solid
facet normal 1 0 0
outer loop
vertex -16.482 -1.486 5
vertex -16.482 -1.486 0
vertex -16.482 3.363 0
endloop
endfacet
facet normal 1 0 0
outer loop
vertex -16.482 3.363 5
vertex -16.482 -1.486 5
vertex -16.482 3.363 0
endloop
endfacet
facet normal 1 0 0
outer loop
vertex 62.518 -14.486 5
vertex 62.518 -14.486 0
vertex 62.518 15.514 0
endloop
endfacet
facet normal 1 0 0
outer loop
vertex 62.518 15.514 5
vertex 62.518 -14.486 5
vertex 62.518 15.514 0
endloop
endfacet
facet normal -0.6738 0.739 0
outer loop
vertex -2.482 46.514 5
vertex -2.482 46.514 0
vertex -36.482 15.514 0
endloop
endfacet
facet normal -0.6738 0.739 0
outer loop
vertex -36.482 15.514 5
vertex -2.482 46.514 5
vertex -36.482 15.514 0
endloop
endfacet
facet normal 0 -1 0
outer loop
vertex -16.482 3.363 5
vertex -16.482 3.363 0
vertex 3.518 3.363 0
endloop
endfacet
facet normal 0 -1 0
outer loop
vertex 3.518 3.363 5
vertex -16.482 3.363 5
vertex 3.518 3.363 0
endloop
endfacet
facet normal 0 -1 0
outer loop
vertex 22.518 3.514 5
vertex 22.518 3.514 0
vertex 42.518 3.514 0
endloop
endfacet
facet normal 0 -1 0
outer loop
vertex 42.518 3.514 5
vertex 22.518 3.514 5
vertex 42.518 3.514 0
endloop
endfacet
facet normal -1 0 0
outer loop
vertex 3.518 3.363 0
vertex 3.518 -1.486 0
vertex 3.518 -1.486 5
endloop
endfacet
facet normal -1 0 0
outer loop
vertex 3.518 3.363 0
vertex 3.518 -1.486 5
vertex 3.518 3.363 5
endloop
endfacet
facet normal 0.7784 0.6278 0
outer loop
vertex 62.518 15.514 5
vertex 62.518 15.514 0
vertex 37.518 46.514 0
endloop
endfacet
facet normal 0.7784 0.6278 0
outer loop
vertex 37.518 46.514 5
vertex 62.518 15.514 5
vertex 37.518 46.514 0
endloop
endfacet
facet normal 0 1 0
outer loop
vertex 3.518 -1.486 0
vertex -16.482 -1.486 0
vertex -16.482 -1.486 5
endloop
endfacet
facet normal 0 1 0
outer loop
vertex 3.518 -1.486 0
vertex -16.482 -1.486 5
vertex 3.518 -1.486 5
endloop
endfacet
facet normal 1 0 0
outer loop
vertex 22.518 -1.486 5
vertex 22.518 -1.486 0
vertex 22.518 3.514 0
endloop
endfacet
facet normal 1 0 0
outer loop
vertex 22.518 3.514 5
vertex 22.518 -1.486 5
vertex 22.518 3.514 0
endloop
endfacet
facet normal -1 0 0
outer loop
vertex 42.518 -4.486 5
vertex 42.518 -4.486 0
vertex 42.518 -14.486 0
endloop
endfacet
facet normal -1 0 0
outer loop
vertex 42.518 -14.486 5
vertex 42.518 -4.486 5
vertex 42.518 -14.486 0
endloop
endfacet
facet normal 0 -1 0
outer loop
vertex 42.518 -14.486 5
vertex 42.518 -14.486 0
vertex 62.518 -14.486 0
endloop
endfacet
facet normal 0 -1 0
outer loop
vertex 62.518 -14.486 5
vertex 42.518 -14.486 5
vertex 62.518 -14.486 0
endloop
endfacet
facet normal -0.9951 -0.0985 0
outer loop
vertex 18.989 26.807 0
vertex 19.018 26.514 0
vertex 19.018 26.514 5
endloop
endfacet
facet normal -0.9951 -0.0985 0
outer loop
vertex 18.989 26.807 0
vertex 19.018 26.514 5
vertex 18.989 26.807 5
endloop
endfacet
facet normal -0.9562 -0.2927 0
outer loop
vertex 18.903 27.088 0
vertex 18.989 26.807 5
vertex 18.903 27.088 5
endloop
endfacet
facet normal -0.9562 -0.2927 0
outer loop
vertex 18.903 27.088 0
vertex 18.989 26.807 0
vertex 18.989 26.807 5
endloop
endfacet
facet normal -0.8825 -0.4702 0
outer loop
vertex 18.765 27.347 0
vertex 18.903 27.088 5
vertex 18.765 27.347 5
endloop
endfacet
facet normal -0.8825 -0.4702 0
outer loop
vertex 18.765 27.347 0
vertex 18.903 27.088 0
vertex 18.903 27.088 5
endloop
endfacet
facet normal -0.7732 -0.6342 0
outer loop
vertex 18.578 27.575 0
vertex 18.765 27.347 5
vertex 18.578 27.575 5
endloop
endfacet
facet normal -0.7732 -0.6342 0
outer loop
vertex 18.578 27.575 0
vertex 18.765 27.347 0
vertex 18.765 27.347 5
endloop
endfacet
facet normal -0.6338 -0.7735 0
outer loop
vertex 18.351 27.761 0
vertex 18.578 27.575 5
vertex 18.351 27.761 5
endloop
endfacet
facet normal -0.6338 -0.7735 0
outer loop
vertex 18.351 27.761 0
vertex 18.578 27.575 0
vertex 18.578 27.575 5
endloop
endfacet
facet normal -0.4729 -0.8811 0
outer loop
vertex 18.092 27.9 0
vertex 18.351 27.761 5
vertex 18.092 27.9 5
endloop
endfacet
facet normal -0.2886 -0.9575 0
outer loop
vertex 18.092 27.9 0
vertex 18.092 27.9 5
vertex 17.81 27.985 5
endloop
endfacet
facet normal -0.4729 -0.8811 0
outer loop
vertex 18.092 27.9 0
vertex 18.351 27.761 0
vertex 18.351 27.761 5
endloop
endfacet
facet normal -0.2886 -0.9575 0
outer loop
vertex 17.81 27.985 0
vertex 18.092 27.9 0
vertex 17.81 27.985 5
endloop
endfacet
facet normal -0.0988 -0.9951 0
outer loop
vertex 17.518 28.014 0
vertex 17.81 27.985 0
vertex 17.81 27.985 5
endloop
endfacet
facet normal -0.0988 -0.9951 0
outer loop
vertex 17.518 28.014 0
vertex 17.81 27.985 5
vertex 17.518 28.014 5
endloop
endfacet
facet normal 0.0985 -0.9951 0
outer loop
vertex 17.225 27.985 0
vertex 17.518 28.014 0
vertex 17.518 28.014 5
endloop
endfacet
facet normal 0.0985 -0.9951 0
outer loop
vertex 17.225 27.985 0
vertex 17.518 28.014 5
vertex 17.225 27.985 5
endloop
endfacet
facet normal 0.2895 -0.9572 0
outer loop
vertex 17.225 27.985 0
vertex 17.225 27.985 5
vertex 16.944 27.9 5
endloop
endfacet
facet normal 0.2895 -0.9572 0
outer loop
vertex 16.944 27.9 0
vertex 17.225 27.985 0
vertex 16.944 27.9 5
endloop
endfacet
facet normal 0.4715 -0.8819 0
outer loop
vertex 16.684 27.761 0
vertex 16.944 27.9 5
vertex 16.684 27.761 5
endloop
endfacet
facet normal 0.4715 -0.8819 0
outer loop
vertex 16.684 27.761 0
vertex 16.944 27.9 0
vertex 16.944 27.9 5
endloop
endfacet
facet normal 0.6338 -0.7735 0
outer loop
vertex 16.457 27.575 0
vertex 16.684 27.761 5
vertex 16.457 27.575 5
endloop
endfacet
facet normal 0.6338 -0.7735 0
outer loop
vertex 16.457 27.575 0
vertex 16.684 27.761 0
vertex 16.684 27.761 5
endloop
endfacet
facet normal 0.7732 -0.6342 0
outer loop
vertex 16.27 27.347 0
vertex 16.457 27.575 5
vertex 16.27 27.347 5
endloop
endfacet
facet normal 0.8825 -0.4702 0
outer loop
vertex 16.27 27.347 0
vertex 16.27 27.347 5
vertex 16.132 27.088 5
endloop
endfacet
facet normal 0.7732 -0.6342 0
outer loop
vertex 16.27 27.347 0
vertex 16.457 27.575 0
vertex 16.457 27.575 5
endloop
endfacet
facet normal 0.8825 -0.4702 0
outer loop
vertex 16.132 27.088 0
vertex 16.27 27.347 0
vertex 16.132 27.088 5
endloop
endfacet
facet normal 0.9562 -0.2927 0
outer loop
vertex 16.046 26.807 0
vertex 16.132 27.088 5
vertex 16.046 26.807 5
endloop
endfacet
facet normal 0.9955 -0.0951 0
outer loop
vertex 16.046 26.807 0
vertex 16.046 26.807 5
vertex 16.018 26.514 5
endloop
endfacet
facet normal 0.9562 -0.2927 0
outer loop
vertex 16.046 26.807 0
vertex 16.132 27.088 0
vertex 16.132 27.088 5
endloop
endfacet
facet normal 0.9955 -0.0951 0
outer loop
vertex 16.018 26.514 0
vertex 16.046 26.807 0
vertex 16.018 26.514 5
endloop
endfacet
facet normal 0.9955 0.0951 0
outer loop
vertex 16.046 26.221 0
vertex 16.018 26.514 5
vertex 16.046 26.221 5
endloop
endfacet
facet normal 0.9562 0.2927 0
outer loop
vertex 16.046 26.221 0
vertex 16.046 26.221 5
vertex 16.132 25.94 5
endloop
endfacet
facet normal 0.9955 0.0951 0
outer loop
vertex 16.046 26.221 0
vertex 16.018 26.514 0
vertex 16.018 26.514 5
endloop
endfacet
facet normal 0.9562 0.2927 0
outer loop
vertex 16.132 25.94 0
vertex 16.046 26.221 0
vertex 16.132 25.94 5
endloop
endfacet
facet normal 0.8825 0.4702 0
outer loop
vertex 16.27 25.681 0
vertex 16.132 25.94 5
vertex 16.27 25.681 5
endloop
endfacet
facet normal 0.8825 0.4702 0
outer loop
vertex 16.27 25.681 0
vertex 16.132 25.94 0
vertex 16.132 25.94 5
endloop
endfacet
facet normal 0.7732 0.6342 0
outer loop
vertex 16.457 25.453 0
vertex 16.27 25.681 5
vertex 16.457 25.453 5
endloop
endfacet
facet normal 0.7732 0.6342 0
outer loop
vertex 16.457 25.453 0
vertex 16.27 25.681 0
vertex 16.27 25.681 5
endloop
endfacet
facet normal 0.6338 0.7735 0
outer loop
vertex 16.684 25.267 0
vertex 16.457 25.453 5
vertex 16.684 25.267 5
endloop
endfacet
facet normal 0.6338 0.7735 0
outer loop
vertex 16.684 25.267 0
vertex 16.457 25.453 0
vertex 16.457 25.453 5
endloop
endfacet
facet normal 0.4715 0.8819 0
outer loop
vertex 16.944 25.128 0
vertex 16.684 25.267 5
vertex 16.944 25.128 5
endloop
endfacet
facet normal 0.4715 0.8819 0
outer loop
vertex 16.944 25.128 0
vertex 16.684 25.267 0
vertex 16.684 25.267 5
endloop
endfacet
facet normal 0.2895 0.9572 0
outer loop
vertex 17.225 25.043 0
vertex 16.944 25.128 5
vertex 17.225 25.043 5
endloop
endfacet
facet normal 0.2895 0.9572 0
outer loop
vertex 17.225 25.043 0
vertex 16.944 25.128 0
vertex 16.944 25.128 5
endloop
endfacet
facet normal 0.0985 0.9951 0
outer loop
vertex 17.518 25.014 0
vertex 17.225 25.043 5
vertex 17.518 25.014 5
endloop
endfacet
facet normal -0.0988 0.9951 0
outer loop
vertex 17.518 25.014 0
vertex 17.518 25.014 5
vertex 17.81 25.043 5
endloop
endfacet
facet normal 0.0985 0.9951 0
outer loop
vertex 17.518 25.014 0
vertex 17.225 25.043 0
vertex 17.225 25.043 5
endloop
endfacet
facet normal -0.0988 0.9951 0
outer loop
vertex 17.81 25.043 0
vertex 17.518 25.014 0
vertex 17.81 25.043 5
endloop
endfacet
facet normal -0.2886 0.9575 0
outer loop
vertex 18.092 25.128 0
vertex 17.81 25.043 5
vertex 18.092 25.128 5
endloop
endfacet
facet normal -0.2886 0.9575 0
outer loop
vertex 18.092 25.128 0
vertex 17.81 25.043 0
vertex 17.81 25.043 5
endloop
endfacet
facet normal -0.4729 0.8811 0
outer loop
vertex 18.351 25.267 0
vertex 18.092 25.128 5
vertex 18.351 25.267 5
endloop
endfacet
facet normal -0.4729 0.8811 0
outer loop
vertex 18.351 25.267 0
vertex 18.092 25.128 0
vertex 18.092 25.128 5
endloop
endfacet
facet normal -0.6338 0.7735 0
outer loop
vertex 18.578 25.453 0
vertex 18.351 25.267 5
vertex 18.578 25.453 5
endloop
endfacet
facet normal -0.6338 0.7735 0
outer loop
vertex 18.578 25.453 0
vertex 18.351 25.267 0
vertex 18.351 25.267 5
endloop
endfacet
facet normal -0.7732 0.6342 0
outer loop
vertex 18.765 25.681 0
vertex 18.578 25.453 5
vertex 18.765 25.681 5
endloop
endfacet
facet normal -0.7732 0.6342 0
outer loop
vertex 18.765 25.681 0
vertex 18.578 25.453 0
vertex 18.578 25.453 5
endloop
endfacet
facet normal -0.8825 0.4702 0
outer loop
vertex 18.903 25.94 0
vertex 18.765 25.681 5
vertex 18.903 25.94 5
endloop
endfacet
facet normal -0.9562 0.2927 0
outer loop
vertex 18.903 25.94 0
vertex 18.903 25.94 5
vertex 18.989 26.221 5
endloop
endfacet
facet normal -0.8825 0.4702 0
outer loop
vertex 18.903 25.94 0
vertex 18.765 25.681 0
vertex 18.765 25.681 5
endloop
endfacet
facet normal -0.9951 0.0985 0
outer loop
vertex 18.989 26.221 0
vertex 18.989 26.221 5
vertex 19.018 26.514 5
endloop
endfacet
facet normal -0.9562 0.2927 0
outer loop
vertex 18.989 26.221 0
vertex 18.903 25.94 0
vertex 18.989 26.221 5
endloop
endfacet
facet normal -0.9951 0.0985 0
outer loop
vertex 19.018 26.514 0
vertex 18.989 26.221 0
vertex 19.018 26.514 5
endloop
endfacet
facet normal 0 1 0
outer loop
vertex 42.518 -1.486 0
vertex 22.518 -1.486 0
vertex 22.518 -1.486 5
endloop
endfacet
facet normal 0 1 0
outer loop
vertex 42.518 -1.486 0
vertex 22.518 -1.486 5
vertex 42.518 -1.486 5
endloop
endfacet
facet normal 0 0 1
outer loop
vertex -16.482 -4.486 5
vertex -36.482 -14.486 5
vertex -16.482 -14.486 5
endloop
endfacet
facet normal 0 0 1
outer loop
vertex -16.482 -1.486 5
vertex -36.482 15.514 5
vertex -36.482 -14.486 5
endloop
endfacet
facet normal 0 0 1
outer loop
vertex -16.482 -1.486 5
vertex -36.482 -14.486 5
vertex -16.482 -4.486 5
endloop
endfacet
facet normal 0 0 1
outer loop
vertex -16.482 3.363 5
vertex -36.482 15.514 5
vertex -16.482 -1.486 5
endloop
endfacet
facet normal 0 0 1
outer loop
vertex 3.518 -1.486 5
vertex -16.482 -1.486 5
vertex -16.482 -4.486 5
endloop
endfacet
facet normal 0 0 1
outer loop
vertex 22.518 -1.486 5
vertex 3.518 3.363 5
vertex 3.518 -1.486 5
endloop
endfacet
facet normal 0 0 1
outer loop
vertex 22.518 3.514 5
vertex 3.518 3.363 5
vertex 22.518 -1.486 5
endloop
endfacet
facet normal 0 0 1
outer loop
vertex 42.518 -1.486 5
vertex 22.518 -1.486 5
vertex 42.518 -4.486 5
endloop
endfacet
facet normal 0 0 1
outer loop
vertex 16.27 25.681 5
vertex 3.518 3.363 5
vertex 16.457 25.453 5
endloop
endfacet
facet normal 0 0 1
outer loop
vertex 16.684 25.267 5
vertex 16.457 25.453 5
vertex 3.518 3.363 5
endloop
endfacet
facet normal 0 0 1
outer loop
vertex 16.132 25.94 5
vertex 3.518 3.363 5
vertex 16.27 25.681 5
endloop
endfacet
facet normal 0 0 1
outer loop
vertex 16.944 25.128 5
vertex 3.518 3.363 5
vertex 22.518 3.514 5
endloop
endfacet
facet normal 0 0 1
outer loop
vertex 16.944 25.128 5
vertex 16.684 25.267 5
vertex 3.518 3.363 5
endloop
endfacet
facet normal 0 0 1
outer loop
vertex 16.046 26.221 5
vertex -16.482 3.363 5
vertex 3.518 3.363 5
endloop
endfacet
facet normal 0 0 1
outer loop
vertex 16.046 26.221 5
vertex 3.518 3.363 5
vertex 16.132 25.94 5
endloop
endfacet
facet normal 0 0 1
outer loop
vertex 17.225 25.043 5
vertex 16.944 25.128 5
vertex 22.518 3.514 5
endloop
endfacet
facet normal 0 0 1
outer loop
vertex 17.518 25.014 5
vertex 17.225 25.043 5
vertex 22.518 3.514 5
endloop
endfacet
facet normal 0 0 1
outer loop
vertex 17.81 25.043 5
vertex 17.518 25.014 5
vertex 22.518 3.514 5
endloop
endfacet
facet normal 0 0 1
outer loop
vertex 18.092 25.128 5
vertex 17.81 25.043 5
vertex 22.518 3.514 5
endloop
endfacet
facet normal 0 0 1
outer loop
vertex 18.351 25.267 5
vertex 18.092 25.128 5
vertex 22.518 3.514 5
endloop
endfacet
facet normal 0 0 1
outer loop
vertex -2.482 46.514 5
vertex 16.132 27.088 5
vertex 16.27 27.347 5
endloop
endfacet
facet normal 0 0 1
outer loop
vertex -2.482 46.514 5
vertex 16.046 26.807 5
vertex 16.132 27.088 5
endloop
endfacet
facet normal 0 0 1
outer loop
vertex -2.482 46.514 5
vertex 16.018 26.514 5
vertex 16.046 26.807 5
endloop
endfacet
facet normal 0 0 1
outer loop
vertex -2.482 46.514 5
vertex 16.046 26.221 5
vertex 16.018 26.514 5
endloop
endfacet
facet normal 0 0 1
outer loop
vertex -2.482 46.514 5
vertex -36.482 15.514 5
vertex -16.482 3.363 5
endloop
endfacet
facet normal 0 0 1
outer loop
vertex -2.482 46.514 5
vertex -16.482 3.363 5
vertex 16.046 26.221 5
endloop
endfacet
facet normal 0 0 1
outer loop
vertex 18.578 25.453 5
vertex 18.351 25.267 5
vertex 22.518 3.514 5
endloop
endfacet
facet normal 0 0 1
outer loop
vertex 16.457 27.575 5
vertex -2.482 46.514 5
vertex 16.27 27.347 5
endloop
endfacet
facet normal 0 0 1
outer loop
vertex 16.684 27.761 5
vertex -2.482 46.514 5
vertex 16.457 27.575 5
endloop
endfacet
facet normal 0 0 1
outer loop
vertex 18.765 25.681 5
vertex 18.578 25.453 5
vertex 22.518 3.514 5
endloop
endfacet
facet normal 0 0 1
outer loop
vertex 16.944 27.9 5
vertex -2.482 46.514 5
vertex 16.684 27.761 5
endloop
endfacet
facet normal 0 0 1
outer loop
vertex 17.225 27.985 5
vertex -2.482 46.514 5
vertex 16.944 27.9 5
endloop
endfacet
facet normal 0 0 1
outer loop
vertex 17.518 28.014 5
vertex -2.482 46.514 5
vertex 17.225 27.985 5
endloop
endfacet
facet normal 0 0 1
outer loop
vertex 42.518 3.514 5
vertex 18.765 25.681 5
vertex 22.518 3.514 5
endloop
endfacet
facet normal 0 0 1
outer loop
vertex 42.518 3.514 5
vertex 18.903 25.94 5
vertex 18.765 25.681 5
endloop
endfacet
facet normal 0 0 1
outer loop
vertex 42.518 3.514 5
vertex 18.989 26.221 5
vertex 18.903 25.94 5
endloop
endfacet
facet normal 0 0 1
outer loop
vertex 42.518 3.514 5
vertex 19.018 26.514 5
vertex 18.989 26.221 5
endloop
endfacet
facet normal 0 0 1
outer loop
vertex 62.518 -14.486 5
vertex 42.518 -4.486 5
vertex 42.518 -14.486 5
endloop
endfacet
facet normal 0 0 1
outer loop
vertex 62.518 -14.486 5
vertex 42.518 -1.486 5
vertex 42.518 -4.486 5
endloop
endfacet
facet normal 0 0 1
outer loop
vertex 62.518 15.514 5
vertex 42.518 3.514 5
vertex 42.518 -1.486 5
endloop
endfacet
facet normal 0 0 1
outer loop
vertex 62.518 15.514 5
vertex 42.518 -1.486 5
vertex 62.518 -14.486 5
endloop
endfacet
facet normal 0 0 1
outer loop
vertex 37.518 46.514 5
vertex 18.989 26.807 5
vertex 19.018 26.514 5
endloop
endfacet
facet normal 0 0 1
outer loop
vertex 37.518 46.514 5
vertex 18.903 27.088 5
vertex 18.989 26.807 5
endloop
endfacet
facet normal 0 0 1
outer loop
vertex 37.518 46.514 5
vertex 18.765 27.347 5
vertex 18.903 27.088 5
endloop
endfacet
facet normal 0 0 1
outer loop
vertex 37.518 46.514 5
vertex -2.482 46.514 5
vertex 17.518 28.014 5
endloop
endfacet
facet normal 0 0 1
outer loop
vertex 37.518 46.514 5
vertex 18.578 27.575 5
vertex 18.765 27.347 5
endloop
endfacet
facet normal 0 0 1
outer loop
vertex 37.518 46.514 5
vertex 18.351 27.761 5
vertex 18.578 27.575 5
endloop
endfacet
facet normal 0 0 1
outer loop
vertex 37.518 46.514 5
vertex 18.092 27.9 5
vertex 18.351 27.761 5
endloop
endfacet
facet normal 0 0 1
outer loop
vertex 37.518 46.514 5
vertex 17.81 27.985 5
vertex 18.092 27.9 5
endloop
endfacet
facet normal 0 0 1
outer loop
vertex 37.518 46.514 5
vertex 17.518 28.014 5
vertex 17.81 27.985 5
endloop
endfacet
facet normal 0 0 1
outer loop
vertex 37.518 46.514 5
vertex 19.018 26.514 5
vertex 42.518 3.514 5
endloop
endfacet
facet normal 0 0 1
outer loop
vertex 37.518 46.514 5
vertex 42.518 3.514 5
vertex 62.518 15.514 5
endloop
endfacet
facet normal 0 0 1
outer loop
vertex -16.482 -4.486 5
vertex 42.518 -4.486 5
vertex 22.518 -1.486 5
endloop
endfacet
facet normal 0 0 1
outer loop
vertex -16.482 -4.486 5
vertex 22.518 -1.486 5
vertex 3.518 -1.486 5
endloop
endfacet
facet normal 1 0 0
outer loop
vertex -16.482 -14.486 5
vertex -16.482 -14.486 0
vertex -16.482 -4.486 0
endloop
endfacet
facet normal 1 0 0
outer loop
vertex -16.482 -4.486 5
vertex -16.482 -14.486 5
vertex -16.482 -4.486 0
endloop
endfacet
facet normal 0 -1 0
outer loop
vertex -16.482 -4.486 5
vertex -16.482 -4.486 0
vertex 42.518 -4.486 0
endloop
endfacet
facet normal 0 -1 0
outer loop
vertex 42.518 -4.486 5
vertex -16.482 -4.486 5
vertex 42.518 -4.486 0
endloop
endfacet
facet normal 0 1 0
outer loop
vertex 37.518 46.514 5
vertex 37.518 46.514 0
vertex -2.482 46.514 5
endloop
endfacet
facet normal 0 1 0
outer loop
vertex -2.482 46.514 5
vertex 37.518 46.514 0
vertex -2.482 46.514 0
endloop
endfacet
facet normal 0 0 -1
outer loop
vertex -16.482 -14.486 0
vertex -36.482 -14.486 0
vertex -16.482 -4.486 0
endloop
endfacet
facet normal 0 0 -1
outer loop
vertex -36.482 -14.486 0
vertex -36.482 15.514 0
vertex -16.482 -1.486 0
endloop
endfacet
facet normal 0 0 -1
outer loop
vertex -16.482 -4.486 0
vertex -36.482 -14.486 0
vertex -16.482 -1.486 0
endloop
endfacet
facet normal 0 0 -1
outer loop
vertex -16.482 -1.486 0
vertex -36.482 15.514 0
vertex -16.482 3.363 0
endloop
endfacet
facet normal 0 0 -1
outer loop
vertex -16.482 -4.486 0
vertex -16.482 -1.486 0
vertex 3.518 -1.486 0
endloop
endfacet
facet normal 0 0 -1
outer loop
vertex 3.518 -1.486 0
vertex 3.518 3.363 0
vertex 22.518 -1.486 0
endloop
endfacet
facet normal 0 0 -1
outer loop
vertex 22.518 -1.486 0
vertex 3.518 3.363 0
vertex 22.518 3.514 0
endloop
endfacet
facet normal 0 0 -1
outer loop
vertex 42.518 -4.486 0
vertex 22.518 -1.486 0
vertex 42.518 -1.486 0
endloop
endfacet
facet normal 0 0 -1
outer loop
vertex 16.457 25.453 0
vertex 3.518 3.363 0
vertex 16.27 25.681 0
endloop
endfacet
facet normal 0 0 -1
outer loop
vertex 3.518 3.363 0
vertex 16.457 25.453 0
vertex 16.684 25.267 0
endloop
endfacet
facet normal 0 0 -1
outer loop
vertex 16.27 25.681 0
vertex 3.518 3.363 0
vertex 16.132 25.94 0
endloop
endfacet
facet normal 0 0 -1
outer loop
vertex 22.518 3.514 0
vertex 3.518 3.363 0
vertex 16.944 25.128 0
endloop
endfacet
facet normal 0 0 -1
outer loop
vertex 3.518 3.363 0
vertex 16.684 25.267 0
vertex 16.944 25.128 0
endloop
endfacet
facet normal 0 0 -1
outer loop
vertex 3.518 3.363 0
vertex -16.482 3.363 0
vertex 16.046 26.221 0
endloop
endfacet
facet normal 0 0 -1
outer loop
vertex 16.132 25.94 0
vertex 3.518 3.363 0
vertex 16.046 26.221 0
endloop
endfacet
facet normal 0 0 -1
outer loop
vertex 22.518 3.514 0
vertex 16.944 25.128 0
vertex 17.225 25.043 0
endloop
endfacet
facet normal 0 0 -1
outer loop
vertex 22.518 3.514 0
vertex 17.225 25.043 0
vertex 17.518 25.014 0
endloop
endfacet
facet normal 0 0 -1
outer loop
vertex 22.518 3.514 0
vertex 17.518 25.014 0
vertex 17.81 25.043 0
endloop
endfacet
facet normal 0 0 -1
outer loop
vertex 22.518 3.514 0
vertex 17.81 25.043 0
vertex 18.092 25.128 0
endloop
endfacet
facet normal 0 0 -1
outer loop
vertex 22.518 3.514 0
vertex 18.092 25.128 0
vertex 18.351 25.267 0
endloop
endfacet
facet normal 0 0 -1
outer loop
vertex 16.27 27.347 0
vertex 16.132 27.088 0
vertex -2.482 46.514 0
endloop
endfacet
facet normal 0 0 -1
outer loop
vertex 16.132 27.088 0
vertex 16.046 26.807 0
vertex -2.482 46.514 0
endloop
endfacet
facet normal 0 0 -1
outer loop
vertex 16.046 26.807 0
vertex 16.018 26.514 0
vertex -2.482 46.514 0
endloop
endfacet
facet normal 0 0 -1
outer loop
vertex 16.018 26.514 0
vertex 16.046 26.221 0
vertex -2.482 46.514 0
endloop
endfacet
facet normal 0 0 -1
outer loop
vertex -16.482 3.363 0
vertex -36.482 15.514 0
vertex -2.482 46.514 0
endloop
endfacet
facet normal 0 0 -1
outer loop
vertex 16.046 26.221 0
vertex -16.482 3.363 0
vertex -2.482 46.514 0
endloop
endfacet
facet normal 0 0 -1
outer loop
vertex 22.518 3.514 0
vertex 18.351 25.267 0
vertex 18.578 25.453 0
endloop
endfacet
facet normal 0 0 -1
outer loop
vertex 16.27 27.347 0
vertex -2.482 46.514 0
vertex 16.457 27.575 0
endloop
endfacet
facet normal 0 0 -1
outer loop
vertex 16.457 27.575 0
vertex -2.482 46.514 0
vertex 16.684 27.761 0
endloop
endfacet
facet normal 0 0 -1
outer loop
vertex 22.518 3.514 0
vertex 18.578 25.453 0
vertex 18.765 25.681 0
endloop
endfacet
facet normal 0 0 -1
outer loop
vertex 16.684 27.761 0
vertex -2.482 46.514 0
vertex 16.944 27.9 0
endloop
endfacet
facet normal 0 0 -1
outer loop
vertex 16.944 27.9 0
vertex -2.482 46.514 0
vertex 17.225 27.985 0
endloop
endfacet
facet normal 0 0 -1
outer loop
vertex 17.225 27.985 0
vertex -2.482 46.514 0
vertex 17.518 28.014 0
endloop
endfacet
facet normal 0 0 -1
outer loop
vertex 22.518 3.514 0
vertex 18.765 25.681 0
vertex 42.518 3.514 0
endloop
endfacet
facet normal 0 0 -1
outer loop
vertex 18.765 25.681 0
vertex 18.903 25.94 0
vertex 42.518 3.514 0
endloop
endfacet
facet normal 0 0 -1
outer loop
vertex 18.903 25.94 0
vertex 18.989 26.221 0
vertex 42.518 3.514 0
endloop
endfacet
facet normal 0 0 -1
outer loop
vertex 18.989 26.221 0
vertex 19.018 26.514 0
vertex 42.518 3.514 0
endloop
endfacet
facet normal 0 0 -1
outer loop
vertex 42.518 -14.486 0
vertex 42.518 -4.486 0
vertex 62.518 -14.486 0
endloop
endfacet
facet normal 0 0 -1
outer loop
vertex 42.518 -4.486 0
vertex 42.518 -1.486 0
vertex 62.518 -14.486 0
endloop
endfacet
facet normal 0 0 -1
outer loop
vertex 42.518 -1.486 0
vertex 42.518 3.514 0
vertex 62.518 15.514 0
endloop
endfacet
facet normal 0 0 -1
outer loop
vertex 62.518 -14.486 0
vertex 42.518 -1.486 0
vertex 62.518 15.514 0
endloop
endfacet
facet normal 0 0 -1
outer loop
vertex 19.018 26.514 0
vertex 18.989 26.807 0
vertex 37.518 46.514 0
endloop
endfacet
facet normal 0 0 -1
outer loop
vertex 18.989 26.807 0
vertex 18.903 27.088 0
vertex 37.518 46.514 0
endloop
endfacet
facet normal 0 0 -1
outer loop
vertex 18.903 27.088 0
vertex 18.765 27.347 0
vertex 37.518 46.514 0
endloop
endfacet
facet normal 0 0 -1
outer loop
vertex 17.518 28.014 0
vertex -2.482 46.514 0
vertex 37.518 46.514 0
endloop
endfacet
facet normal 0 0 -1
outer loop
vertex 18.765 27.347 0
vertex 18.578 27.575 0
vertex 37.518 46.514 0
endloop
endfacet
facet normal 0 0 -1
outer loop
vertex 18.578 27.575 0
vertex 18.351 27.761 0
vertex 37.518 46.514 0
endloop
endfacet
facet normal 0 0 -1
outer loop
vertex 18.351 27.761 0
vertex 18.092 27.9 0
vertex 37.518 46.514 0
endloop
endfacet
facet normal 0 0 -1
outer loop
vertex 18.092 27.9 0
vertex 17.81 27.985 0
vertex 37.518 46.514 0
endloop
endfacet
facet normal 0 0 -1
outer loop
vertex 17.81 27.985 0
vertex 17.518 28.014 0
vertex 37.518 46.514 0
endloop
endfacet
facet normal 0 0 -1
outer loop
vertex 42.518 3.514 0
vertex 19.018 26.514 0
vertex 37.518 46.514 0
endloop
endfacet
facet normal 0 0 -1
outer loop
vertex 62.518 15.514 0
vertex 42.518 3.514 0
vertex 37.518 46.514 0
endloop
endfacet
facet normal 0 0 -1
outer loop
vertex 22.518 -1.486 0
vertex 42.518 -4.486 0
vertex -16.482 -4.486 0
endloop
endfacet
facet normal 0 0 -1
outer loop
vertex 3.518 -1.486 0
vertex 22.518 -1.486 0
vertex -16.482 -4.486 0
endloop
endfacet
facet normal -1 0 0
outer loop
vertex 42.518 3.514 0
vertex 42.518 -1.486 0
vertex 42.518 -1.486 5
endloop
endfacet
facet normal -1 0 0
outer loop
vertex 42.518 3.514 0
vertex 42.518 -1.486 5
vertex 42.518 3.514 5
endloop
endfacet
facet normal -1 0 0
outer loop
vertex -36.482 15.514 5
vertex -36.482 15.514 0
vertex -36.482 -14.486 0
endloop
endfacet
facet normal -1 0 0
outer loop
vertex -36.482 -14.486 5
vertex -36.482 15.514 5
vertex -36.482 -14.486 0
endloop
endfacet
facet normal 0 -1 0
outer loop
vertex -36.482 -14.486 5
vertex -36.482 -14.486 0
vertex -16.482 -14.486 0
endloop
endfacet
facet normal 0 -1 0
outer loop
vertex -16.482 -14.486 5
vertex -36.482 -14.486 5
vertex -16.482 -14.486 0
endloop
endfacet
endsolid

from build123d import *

# Parameters (mm, degrees)
SKETCH1_R           = 1.5
SKETCH1_W           = 20
SKETCH1_H           = 4.848691284
SKETCH1_H_2         = 5
BOSS_EXTRUDE1_DEPTH = 5


with BuildPart() as part:
    # Sketch1 → Boss-Extrude1 (new body)
    with BuildSketch(Plane.XY):
        Polygon((-36.482398682, -14.486104614), (-16.482398682, -14.486104614), (-16.482398682, -4.486104614), (42.517601318, -4.486104614), (42.517601318, -14.486104614), (62.517601318, -14.486104614), (62.517601318, 15.513895386), (37.517601318, 46.513895386), (17.517601318, 46.513895386), (-2.482398682, 46.513895386), (-36.482398682, 15.513895386), align=None)
        with Locations((17.517601318, 26.513895386)):
            Circle(SKETCH1_R, mode=Mode.SUBTRACT)
        with Locations((-6.482398682, 0.938241028)):
            Rectangle(SKETCH1_W, SKETCH1_H, mode=Mode.SUBTRACT)
        with Locations((32.517601318, 1.013895386)):
            Rectangle(SKETCH1_W, SKETCH1_H_2, mode=Mode.SUBTRACT)
    extrude(amount=BOSS_EXTRUDE1_DEPTH)


solid = part.part
